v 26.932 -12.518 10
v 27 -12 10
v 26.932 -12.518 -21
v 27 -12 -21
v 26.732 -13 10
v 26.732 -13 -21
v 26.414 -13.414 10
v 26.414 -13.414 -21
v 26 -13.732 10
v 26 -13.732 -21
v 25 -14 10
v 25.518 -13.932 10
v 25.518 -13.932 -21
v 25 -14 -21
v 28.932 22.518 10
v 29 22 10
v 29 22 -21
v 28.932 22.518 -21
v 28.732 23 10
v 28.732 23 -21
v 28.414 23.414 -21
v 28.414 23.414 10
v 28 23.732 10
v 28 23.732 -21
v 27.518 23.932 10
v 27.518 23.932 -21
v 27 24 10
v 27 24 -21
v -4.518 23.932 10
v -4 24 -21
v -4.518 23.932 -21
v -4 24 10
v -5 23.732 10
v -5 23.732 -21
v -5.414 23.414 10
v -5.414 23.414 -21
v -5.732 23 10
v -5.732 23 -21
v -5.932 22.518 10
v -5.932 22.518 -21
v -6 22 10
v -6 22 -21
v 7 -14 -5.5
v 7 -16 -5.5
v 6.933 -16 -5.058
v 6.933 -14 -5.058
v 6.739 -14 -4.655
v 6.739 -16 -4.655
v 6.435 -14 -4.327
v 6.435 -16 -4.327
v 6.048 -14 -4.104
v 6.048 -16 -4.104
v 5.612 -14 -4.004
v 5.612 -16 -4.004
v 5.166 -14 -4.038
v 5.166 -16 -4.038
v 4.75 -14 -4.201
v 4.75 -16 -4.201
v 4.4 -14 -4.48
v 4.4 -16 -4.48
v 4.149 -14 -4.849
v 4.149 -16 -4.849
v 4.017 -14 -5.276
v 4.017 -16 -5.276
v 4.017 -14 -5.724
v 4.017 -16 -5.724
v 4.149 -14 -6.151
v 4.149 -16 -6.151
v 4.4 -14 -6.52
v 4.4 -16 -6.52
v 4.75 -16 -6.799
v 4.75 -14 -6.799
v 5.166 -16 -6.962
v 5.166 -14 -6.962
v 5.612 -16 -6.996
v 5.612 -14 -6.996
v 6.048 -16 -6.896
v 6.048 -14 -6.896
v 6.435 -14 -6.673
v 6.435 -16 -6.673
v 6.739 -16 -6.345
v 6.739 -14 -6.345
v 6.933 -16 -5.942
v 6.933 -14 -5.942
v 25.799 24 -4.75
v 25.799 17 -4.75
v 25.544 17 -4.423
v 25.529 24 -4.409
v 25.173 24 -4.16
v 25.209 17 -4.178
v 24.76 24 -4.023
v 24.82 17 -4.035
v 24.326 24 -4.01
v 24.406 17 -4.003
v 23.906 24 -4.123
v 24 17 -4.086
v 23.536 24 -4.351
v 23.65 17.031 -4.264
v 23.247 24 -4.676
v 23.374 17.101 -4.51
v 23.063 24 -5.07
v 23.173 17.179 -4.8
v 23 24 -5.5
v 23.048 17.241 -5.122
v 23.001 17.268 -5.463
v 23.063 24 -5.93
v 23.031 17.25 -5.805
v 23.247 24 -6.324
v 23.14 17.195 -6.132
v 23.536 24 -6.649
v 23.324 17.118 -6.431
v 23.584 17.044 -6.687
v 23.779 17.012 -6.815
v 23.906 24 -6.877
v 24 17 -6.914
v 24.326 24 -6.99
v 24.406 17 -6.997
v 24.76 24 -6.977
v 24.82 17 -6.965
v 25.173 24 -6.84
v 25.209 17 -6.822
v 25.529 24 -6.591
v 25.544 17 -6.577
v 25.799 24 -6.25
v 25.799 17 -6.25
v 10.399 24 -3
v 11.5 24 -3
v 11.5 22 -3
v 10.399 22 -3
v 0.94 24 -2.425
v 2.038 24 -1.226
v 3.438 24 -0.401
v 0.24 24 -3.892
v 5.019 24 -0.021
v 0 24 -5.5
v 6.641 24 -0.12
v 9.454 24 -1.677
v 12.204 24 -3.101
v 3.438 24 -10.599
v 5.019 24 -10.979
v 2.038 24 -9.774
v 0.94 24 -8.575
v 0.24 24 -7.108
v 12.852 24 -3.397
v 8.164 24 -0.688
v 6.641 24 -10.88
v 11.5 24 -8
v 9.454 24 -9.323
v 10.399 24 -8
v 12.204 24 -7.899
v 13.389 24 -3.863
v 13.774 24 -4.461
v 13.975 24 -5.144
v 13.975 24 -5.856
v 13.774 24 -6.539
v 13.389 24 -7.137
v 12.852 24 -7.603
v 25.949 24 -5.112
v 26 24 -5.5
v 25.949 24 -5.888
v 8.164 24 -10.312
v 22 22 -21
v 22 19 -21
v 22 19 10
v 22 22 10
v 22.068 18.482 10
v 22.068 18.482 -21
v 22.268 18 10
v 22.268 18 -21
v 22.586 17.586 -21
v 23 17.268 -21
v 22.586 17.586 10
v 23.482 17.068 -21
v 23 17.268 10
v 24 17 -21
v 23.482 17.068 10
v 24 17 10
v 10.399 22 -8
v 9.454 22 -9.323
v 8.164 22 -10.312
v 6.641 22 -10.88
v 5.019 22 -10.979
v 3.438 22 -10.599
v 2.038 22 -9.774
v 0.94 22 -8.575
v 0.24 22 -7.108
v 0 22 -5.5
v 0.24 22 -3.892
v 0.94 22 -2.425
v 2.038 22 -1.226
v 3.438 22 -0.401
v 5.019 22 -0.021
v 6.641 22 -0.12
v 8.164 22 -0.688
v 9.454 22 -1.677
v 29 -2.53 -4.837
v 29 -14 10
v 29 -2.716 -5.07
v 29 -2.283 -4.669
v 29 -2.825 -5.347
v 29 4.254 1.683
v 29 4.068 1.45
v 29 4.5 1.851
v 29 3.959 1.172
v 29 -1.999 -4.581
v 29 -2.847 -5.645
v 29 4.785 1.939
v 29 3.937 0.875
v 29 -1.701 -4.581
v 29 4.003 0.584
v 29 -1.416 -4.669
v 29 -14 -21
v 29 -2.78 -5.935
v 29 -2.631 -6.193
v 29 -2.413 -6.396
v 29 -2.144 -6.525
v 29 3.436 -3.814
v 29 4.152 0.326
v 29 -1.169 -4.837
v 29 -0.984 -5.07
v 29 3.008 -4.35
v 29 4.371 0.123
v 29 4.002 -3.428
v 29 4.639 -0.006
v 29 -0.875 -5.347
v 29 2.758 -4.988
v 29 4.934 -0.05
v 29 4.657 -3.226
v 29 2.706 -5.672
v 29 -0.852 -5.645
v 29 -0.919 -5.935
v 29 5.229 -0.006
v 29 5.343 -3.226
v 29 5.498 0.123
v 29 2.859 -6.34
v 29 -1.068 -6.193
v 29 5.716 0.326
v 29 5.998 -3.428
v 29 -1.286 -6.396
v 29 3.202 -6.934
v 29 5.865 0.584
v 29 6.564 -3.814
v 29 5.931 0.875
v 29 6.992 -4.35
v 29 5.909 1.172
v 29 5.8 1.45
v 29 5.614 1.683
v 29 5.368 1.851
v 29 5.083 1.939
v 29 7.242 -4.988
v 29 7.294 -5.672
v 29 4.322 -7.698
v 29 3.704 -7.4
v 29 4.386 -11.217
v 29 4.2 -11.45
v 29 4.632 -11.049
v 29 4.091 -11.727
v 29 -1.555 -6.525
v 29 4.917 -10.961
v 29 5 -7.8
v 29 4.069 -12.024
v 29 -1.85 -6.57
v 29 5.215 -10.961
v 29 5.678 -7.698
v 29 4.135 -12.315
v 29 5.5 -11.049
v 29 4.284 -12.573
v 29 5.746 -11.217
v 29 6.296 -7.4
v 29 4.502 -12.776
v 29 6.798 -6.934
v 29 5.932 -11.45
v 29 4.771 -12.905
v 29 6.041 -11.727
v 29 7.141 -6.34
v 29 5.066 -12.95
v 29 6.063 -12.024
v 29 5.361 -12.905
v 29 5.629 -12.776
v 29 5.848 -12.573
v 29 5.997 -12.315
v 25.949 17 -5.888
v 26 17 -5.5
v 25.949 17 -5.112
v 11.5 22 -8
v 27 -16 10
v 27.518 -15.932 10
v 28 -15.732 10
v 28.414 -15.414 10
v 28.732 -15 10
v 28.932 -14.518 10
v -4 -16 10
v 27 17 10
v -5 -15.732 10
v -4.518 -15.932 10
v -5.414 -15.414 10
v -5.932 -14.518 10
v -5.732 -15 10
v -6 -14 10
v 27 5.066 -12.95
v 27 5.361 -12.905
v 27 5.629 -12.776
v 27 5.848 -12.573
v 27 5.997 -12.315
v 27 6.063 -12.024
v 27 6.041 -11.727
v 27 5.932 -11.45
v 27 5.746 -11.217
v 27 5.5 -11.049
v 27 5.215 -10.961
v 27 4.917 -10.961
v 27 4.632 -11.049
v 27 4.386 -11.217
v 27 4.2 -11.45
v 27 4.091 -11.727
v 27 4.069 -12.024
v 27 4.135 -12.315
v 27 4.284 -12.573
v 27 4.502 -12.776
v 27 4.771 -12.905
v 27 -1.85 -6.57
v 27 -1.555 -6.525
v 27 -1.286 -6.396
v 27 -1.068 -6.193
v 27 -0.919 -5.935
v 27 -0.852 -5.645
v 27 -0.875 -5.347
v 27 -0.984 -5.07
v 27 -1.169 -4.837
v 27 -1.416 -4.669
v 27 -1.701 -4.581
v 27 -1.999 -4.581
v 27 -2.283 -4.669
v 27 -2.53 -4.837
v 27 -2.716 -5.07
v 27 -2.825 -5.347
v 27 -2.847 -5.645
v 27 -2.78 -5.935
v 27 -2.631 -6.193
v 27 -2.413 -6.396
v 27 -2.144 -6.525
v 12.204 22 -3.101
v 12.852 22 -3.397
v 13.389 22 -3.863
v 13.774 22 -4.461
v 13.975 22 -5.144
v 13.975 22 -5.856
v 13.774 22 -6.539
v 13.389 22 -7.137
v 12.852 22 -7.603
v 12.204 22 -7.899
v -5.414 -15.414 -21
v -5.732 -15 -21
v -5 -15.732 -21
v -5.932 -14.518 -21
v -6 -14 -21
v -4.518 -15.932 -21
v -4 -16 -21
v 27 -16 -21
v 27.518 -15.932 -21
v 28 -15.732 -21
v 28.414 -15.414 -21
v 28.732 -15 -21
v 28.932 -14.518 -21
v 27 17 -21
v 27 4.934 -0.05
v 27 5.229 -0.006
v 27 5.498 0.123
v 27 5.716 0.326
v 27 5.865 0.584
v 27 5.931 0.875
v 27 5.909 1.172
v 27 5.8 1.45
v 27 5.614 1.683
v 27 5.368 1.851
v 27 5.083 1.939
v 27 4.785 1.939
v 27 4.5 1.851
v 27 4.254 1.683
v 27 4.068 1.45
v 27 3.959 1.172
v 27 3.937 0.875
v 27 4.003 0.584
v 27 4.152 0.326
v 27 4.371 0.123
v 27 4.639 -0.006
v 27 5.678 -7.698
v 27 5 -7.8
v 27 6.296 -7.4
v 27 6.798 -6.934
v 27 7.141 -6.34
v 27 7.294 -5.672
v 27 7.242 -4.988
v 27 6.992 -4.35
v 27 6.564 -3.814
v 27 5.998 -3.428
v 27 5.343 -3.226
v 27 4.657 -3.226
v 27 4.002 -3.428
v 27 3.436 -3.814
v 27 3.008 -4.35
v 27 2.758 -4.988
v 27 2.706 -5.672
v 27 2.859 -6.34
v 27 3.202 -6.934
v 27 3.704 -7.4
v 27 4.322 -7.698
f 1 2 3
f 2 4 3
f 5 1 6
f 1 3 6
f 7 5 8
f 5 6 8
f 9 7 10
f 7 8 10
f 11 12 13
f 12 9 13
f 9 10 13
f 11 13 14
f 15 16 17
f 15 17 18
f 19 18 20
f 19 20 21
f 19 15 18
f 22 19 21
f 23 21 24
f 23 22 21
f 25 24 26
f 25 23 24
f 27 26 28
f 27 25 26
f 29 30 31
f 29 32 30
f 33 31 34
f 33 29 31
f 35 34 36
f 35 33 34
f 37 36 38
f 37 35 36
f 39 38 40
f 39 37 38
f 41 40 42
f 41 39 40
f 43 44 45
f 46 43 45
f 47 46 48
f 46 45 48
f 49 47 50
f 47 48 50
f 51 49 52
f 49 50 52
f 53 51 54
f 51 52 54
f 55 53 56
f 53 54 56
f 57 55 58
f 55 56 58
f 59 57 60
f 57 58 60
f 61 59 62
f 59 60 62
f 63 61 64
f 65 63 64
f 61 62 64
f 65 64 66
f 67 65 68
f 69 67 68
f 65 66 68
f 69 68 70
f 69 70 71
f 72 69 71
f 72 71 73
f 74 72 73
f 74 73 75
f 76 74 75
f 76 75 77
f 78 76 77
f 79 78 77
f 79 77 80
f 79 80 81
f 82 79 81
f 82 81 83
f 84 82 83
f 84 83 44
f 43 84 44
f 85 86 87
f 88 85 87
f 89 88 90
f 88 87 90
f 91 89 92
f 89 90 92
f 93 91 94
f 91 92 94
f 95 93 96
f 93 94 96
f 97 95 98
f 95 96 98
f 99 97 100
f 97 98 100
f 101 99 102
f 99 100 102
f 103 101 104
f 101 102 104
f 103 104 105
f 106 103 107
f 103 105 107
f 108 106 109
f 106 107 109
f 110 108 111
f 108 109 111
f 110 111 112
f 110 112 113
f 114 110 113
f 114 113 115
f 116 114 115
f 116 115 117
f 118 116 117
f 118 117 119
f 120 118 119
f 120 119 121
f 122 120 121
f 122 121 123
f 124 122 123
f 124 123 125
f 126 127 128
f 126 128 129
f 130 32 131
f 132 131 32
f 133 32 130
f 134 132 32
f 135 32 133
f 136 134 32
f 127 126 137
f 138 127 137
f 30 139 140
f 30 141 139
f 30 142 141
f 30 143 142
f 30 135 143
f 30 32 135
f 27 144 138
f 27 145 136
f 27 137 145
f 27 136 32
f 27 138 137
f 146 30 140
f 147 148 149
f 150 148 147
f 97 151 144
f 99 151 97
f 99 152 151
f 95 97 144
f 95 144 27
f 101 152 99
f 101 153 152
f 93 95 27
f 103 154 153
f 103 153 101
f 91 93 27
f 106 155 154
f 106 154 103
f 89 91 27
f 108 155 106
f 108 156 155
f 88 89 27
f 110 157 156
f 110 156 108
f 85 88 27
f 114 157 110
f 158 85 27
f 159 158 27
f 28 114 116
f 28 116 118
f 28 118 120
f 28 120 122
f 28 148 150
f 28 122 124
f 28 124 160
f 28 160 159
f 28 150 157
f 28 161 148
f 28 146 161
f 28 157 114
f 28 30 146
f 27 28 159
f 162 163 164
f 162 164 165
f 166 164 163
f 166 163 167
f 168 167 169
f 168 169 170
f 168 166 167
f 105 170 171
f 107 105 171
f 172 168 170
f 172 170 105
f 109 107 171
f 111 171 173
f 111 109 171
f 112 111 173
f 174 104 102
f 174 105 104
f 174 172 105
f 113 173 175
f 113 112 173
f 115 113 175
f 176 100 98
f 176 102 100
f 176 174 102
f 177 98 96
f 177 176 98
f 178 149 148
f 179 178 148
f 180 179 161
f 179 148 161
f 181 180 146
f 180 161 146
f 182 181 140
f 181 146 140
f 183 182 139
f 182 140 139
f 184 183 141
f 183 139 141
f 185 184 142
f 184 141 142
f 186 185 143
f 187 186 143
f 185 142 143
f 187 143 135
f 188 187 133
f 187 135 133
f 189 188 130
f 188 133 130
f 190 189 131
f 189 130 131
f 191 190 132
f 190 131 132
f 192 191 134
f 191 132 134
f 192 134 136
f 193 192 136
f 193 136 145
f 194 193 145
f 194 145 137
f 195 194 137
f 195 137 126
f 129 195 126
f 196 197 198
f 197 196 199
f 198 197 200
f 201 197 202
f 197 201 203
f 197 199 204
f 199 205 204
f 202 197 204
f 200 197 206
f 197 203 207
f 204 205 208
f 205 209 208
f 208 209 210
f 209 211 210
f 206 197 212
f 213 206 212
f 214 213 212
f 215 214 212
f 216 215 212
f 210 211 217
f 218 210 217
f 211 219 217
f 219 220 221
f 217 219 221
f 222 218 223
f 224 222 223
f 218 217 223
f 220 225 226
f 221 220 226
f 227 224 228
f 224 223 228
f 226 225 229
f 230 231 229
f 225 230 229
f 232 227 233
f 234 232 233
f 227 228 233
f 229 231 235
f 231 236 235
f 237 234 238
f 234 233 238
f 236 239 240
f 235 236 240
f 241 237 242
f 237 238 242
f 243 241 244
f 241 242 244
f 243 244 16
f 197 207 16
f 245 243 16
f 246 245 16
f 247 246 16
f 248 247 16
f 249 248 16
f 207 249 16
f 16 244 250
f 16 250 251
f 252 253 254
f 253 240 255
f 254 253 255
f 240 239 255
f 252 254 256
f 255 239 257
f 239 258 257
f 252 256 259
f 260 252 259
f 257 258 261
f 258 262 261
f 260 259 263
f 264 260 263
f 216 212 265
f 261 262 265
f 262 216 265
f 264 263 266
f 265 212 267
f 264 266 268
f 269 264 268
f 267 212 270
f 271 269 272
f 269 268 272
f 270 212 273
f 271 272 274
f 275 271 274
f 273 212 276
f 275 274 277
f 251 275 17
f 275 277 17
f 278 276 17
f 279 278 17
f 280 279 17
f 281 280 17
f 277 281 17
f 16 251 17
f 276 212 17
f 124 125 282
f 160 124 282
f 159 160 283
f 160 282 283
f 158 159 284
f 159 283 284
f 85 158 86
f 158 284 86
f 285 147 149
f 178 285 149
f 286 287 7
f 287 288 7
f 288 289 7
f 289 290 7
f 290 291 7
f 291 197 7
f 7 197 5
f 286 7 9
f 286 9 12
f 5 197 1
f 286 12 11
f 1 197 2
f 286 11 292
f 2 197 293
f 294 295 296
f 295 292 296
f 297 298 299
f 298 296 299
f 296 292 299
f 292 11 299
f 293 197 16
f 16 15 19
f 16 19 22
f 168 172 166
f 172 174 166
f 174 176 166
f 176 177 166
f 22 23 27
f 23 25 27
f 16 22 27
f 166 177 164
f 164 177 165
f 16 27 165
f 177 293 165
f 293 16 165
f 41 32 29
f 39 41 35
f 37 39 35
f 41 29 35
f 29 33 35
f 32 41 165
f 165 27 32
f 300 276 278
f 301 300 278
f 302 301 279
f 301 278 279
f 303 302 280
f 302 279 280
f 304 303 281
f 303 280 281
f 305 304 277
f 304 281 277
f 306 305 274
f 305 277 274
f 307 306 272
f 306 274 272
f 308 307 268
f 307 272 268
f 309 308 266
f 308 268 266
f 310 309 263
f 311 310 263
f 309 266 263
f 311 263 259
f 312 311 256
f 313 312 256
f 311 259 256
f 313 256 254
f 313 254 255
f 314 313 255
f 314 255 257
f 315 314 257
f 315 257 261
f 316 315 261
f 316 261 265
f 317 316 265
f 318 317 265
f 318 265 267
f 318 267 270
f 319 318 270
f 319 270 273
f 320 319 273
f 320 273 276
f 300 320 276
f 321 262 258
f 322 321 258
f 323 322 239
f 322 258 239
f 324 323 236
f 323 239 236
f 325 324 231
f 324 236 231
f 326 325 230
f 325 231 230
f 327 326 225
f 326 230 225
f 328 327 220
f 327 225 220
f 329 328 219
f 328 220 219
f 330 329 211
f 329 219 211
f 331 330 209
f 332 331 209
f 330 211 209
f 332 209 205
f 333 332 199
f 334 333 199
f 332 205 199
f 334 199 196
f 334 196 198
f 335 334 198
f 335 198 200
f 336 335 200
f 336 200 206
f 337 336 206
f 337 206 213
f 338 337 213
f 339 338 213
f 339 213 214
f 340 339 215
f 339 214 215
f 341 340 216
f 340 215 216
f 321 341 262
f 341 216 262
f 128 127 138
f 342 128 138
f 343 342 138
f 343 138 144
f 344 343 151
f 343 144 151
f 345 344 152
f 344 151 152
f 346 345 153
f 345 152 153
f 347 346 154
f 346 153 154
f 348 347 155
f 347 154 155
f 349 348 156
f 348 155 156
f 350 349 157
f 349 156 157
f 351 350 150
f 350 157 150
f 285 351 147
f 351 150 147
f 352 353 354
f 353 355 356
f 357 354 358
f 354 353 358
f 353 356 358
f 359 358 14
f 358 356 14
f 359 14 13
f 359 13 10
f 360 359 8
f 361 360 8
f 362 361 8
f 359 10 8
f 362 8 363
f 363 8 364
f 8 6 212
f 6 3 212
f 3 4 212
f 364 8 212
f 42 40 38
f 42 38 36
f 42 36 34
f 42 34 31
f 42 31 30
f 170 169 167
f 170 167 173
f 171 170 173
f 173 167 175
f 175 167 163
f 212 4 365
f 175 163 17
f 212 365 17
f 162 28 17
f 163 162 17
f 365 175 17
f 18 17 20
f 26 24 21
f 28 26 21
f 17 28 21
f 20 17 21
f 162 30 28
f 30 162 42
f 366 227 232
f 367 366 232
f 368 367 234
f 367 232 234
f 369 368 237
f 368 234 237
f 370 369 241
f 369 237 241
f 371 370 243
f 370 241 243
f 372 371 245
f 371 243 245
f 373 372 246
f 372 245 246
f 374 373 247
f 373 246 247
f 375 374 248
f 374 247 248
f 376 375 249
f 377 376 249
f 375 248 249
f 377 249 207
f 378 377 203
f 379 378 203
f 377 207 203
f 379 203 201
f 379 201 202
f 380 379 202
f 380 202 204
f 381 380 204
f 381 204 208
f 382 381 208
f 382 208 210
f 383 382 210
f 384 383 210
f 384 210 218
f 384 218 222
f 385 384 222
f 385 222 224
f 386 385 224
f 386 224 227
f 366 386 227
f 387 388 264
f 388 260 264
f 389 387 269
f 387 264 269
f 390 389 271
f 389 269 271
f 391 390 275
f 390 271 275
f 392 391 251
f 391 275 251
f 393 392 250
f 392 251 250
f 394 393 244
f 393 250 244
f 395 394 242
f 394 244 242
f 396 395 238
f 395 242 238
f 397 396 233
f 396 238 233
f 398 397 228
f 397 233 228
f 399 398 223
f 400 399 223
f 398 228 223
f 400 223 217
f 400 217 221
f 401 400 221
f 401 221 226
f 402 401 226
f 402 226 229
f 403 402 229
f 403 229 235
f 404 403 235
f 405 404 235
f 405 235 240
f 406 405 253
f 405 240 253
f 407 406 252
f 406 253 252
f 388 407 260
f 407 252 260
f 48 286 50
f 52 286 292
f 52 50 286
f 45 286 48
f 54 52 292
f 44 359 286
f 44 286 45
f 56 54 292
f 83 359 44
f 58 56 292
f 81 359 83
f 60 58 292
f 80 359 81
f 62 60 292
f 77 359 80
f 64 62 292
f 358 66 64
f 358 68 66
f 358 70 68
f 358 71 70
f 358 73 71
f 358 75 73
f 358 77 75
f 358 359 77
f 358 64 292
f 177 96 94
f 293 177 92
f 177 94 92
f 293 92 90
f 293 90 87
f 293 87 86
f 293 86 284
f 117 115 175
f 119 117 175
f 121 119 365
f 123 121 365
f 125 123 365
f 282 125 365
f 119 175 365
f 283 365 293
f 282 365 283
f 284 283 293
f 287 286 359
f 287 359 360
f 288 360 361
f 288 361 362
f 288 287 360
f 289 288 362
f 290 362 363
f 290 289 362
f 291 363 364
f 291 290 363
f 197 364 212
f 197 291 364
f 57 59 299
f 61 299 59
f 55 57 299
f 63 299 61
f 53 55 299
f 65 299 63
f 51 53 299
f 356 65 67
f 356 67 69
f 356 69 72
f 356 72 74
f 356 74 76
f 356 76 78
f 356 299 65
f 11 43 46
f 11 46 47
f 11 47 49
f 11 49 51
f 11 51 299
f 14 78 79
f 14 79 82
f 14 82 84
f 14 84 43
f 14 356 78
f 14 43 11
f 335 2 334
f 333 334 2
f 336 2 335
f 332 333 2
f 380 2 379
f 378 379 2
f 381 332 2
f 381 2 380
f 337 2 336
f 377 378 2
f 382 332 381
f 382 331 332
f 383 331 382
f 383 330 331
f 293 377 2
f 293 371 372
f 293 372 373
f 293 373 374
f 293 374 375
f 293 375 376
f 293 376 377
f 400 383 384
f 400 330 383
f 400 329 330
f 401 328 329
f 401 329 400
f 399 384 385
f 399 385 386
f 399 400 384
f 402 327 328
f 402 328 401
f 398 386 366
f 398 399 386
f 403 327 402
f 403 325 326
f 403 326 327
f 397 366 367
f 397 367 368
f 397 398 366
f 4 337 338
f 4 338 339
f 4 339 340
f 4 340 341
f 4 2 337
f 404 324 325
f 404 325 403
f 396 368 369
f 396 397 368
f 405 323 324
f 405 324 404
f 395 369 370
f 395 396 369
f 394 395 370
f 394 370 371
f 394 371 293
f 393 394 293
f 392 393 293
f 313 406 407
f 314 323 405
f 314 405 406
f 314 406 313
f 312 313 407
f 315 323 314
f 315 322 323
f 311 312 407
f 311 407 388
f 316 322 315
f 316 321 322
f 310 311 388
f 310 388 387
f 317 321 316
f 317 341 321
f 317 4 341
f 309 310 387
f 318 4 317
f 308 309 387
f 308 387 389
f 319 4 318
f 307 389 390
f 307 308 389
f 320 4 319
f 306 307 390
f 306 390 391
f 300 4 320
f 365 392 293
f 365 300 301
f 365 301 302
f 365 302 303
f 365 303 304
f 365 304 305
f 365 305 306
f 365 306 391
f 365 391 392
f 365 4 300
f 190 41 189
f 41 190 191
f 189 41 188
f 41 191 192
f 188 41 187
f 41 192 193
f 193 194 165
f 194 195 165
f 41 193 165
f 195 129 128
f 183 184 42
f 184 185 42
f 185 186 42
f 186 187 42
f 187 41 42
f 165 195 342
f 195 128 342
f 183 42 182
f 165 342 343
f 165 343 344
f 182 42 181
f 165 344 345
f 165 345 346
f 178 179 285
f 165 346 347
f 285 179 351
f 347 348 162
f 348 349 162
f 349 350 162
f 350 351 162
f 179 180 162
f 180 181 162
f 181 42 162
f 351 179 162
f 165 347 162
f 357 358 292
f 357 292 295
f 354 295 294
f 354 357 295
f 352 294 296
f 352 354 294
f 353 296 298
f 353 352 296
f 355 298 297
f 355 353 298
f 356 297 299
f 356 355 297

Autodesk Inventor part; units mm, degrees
ref_plane "YZ Plane" through (0, 0, 0) normal (1, 0, 0) x (0, 1, 0)
ref_plane "XZ Plane" through (0, 0, 0) normal (0, 1, 0) x (-1, 0, 0)
ref_plane "Work Plane1" through (0, 0, 0) normal (0, 0, 1) x (1, 0, 0)
sketch "Sketch1" plane through (0, 0, 0) normal (0, 0, 1) x (1, 0, 0)
  line L0 (27, 15) -> (27, 17) projected
  line L1 (21.5, 17) -> (26.5, 17) construction
  line L2 (22, 17) -> (22, 21.5) projected
  line L3 (27, 15) -> (27, 17) projected
  line L4 (21.5, 17) -> (26.5, 17) projected
  line L5 (21.5, 22) -> (7.7913, 22) projected
  line L6 (14, 22) -> (14, 26.5) construction
  line L7 (27, 15) -> (27, 17)
  line L8 (22, 17) -> (27, 17)
  line L9 (22, 17) -> (22, 21.5)
  line L10 (21.5, 22) -> (22, 22)
  line L11 (22, 22) -> (22, 21.5)
  line L12 (21.5, 22) -> (14, 22)
  line L13 (11.5, 27) -> (13.5, 27) projected
  line L14 (7.7913, 22) -> (21.5, 22) projected
  line L15 (27, 15) -> (27, 0)
  line L16 (14, 22) -> (14, 24)
  line L17 (14, 24) -> (27, 24)
  line L18 (27, 24) -> (29, 24)
  line L19 (29, -16) -> (29, 24)
  line L20 (29, -16) -> (-6, -16)
  line L21 (-6, -16) -> (-6, -14)
  line L22 (-6, -14) -> (27, -14)
  line L23 (27, -14) -> (27, 0)
  point P0 (0, 0)
  dimension "d0" = 2
  dimension "d1" = 2
  dimension "d2" = 40
  dimension "d3" = 35
  dimension "d4" = 2
extrude "Extrusion1" add sketch "Sketch1" along normal blind 10 and the other way blind 21
sketch "Sketch2" plane through (14, 24, 10) normal (0, 1, 0) x (1, 0, 0)
  arc A0 (-3.601, 18) -> (-3.601, 13) centre (-8.5, 15.5) ccw projected
  arc A1 (-3.601, 18) -> (-3.601, 13) centre (-8.5, 15.5) ccw
  arc A2 (-2.5, 13) -> (-2.5, 18) centre (-2.5, 15.5) ccw projected
  line L0 (-2.5, 13) -> (-3.601, 13) projected
  line L1 (-2.5, 18) -> (-3.601, 18) projected
  arc A3 (-2.5, 13) -> (-2.5, 18) centre (-2.5, 15.5) ccw
  line L2 (-3.601, 13) -> (-2.5, 13)
  line L3 (-3.601, 18) -> (-2.5, 18)
  line L4 (0.5, 15.5) -> (0.5, 0)
  line L5 (15, 0) -> (0, 0) projected
  line L6 (0.5, 15.5) -> (0.5, 31)
  line L7 (0, 31) -> (0, 0) projected
  line L8 (13, 0) -> (-20, 0) projected
  line L9 (0.5, 0) -> (-20, 0)
  line L10 (-20, 31) -> (-20, 0) projected
  line L11 (-20, 0) -> (-20, 31)
  line L12 (-20, 31) -> (0.5, 31)
  point P0 (-14, 10)
  point P1 (0, 15.5)
extrude "Extrusion2" add sketch "Sketch2" against normal blind 2 contours L7 L8 L10 L12
sketch "Sketch3" plane through (22, 17, 10) normal (0, -1, 0) x (1, 0, 0)
  arc A0 (3.799, -14.75) -> (3.799, -16.25) centre (2.5, -15.5) ccw projected
  circle A1 centre (2.5, -15.5) radius 1.5
  point P0 (-22, -10)
  point P1 (3.799, -16.25)
  point P2 (3.799, -14.75)
extrude "Extrusion3" cut sketch "Sketch3" against normal blind 17
sketch "Sketch4" plane through (29, -16, 10) normal (1, 0, 0) x (0, 0, -1)
  line L0 (13, 40) -> (18, 40) projected
  line L1 (15.5, 40) -> (15.5, 21)
  circle A0 centre (15.5, 21) radius 2.3
  point P0 (10, 16)
  dimension "d15" = 19
  dimension "d16" = 4.6
extrude "Extrusion4" cut sketch "Sketch4" against normal blind 2
sketch "Sketch5" plane through (29, -16, 10) normal (1, 0, 0) x (0, 0, -1)
  circle A0 centre (21.9497, 21.0658) radius 0.6
  circle A1 centre (9.0503, 20.9342) radius 0.6
  circle A2 centre (15.4342, 27.4497) radius 0.6
  circle A3 centre (15.5699, 14.1504) radius 0.6
  circle A4 centre (15.4342, 27.4497) radius 1
  circle A5 centre (21.9497, 21.0658) radius 1
  circle A6 centre (15.5699, 14.1504) radius 1
  circle A7 centre (9.0503, 20.9342) radius 1
  point P0 (10, 16)
  dimension "d19" = 2
  dimension "d20" = 2
  dimension "d21" = 2
  dimension "d22" = 2
extrude "Extrusion5" cut sketch "Sketch5" against normal blind 2.1 contours A0 | A1 | A3 | A5 | A6 | A7
fillet "Fillet1" radius 2 4 edges at (27, -14, -5.5) (22, 17, -5.5) (29, 24, -5.5) (29, -16, -5.5)
fillet "Fillet2" radius 2 2 edges at (-6, -16, -5.5) (-6, 24, -5.5)
sketch "Sketch6" plane through (27, -16, -21) normal (0, -1, 0) x (1, 0, 0)
  circle A0 centre (-21.5, 15.5) radius 1.5
  circle A1 centre (-21.5, 15.5) radius 1.5
  point P0 (-27, 21)
extrude "Extrusion6" cut sketch "Sketch6" against normal blind 3
